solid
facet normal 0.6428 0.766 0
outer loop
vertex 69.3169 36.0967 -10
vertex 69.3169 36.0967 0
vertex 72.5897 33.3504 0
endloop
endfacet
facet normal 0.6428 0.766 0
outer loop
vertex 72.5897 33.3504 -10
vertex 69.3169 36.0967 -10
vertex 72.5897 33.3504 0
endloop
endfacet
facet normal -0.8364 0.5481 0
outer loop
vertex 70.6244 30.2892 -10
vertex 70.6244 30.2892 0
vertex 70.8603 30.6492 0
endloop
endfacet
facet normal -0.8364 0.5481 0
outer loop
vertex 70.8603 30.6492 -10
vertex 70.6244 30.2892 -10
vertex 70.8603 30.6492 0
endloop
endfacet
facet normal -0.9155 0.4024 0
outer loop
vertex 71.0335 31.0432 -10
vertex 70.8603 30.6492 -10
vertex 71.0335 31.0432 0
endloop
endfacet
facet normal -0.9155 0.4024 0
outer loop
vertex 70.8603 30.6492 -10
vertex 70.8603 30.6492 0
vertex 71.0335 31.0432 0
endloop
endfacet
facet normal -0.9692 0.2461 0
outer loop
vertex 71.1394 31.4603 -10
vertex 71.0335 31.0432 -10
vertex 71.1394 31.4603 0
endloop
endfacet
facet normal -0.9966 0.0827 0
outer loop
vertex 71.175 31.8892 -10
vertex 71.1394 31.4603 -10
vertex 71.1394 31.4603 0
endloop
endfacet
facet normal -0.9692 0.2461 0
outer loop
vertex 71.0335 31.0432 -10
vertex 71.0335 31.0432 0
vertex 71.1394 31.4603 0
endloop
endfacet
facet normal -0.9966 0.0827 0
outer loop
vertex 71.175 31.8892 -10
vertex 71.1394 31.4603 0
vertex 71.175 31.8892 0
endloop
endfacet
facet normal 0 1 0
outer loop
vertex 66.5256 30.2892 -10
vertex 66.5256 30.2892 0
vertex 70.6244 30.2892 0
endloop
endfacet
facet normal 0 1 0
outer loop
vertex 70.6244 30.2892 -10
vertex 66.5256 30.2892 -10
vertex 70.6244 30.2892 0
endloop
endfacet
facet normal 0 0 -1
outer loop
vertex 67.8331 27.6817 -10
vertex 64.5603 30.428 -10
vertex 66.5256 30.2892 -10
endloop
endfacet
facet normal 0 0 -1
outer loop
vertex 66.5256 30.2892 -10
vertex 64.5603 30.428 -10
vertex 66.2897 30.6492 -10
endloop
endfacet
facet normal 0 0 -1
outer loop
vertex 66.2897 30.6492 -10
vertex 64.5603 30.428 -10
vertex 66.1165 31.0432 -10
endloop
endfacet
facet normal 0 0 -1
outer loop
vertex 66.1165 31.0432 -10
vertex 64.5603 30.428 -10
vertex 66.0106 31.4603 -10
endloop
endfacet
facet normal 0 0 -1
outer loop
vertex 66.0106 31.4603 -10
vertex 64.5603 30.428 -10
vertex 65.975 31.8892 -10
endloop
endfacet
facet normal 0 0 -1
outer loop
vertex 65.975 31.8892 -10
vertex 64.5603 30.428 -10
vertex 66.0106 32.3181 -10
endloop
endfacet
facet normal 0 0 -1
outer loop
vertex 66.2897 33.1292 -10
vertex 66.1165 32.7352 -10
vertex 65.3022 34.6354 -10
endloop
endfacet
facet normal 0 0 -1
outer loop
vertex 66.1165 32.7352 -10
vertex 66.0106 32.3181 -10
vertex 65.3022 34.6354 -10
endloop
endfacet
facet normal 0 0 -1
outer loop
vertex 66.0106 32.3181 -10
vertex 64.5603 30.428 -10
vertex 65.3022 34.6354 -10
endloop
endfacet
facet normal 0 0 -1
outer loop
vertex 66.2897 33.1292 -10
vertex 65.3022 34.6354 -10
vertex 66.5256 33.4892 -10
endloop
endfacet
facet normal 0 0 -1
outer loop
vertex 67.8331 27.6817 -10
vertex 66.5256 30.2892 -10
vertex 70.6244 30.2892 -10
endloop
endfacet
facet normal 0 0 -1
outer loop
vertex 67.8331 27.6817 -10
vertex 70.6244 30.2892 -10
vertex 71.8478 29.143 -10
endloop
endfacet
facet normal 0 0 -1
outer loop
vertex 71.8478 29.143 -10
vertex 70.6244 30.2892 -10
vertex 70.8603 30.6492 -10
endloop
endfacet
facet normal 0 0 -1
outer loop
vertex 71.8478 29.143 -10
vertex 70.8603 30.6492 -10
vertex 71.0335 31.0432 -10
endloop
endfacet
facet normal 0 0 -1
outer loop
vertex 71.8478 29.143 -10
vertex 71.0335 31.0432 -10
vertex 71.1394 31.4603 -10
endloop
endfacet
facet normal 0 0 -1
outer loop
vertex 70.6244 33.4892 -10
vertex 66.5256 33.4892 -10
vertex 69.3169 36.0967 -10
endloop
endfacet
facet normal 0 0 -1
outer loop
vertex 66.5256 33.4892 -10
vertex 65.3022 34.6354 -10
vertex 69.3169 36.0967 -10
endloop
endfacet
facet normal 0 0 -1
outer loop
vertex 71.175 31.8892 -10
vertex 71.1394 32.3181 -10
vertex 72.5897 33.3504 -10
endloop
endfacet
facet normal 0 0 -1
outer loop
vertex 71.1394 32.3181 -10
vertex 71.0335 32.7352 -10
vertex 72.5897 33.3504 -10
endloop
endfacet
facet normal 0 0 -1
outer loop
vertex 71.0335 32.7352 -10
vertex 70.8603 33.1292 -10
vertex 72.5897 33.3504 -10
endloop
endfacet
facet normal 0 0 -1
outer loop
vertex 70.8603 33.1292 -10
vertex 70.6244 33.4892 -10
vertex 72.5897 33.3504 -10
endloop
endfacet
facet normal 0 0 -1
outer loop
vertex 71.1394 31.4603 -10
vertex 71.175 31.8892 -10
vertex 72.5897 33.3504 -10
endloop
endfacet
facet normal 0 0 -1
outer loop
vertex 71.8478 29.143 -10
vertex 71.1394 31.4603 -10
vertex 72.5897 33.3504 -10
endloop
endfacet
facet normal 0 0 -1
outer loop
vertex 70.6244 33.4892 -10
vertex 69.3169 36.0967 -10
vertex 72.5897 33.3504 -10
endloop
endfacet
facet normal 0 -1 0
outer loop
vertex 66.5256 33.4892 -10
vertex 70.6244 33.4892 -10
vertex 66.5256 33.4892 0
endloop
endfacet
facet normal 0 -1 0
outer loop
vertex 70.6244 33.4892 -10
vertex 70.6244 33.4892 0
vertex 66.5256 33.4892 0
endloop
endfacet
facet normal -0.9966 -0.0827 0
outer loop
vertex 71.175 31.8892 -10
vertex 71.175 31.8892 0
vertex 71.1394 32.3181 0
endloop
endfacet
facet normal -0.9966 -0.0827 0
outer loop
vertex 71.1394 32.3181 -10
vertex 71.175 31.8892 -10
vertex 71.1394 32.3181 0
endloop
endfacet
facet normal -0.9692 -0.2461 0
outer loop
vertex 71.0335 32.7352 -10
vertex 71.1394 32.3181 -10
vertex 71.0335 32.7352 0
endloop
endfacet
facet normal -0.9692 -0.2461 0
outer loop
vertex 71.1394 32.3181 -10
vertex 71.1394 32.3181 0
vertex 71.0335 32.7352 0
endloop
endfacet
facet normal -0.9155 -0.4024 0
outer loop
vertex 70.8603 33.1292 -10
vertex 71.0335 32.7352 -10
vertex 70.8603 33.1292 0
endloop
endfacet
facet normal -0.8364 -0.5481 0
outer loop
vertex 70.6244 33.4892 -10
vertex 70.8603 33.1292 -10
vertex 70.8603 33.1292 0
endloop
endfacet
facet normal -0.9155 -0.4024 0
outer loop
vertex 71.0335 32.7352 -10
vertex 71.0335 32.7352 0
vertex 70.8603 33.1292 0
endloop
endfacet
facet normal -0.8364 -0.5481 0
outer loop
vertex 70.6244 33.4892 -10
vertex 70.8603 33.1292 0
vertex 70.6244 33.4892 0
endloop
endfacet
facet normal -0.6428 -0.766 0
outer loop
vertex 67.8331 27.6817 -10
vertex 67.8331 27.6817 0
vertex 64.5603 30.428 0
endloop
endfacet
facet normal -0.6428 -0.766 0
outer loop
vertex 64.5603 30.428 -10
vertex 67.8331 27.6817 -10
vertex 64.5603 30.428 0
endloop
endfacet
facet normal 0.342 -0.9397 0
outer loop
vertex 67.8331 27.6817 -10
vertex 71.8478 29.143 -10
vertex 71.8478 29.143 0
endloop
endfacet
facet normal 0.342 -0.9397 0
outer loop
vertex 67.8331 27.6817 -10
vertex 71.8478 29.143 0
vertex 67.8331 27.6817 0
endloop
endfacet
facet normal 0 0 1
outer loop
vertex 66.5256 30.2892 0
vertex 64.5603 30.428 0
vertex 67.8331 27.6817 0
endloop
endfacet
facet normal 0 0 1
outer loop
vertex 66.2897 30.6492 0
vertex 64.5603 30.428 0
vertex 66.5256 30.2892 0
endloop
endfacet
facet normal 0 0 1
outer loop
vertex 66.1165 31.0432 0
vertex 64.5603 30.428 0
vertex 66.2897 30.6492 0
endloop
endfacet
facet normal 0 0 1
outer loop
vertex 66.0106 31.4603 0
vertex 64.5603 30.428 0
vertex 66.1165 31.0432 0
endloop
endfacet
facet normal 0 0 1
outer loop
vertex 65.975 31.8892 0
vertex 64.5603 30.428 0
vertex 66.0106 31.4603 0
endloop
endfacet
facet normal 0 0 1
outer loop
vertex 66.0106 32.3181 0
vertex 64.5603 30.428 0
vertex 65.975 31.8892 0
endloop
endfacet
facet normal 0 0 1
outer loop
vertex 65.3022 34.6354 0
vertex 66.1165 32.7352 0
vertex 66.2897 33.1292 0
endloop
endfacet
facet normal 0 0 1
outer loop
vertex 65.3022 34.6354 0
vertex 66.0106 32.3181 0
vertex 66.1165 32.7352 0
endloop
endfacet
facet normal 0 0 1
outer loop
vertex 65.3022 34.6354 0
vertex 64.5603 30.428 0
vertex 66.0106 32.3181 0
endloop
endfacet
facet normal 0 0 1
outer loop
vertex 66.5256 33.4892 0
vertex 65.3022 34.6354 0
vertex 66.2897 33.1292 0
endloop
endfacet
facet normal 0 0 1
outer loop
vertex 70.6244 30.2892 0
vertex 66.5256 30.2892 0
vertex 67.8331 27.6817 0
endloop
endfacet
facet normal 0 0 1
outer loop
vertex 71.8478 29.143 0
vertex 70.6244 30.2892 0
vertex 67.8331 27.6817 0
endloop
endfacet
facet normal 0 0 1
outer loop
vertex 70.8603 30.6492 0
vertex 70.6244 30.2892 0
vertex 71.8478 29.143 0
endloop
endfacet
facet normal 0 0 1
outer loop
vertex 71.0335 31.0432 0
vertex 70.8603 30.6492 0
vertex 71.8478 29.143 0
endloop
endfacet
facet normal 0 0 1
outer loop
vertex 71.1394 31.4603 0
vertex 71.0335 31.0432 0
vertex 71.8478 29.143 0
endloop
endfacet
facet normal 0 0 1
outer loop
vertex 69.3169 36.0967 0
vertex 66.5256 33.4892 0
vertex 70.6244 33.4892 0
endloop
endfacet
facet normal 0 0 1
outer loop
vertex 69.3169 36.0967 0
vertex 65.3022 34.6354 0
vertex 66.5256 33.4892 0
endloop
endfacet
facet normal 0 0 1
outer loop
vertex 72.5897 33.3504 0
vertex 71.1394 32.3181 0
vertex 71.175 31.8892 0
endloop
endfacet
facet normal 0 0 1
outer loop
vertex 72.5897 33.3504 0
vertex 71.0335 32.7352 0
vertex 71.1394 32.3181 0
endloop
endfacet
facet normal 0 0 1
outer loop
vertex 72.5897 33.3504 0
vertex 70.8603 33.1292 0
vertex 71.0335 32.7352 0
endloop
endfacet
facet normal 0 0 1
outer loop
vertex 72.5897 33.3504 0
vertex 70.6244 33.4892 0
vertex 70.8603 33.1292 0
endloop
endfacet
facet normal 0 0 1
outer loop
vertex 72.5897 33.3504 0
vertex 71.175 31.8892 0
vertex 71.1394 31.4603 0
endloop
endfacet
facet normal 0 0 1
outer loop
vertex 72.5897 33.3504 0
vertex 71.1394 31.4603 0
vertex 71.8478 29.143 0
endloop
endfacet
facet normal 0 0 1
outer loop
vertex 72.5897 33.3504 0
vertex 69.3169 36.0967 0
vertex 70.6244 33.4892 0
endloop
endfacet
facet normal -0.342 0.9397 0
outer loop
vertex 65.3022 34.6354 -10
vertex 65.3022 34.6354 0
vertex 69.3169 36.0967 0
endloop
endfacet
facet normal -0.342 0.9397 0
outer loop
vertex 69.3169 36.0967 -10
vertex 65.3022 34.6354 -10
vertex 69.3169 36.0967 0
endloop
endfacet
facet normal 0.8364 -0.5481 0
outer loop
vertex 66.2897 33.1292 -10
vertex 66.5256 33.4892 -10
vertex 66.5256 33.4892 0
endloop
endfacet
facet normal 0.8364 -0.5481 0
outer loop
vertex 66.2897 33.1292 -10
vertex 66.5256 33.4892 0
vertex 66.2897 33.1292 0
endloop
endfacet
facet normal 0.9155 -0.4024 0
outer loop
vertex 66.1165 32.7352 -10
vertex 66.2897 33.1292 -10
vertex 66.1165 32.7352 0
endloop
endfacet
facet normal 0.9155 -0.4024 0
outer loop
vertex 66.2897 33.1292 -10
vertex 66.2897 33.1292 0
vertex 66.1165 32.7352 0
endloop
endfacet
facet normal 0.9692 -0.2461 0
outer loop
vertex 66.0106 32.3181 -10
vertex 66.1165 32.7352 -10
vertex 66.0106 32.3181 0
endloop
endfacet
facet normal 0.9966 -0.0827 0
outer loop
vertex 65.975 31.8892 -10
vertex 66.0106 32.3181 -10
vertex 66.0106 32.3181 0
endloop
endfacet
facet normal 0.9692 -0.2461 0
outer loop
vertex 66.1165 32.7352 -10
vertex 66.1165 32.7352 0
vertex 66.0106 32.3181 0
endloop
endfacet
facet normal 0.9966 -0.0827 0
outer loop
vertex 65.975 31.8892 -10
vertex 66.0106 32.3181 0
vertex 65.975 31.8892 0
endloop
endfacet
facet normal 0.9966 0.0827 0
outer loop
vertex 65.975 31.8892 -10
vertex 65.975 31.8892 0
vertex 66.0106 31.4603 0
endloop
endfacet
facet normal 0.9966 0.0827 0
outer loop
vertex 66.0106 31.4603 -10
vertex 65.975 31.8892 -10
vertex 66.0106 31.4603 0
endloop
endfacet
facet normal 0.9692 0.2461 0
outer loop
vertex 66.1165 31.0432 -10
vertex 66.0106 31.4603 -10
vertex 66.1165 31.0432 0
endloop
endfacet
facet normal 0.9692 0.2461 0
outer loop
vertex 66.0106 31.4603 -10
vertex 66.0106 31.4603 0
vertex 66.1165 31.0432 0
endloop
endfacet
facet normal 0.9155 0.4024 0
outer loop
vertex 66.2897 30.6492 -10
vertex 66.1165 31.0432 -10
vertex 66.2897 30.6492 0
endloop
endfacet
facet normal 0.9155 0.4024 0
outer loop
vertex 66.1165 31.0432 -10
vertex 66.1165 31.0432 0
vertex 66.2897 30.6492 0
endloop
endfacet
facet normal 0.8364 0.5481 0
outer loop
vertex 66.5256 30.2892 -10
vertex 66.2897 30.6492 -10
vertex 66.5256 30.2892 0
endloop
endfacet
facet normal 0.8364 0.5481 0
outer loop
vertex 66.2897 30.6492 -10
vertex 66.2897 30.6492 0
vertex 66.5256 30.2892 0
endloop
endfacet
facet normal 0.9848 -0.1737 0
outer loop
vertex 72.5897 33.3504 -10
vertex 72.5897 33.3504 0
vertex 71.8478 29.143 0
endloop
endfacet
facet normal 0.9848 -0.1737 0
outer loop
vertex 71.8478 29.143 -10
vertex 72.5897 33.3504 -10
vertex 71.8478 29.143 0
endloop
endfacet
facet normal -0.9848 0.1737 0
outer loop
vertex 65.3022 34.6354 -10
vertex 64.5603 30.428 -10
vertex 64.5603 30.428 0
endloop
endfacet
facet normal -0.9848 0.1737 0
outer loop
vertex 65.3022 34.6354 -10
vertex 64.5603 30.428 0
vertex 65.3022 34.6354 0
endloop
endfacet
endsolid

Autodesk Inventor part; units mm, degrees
ref_plane "YZ Plane" through (0, 0, 0) normal (1, 0, 0) x (0, 1, 0)
ref_plane "XZ Plane" through (0, 0, 0) normal (0, 1, 0) x (-1, 0, 0)
ref_plane "XY Plane" through (0, 0, 0) normal (0, 0, 1) x (1, 0, 0)
ref_plane "Arbeitsebene1" through (0, 0, 0) normal (0, 0, 1) x (1, 0, 0)
sketch "Skizze1" plane through (0, 0, 0) normal (0, 0, 1) x (1, 0, 0)
  line L0 (66.6303, 35.3317) -> (67.8519, 35.7763) projected
  circle A0 centre (68.575, 31.8892) radius 5.5 projected
  line L1 (65.3022, 34.6354) -> (69.3169, 36.0967)
  line L2 (69.3169, 36.0967) -> (72.5897, 33.3504)
  line L3 (72.5897, 33.3504) -> (71.8478, 29.143)
  line L4 (71.8478, 29.143) -> (67.8331, 27.6817)
  line L5 (67.8331, 27.6817) -> (64.5603, 30.428)
  line L6 (64.5603, 30.428) -> (65.3022, 34.6354)
  arc A1 (66.575, 33.3892) -> (66.075, 31.8892) centre (68.575, 31.8892) ccw projected
  line L7 (70.575, 33.3892) -> (66.575, 33.3892) projected
  arc A2 (71.075, 31.8892) -> (70.575, 33.3892) centre (68.575, 31.8892) ccw projected
  arc A3 (70.575, 30.3892) -> (71.075, 31.8892) centre (68.575, 31.8892) ccw projected
  line L8 (66.575, 30.3892) -> (70.575, 30.3892) projected
  arc A4 (66.075, 31.8892) -> (66.575, 30.3892) centre (68.575, 31.8892) ccw projected
  arc A5 (66.5256, 33.4892) -> (65.975, 31.8892) centre (68.575, 31.8892) ccw
  arc A6 (65.975, 31.8892) -> (66.5256, 30.2892) centre (68.575, 31.8892) ccw
  line L9 (66.5256, 30.2892) -> (70.6244, 30.2892)
  arc A7 (70.6244, 30.2892) -> (71.175, 31.8892) centre (68.575, 31.8892) ccw
  arc A8 (71.175, 31.8892) -> (70.6244, 33.4892) centre (68.575, 31.8892) ccw
  line L10 (70.6244, 33.4892) -> (66.5256, 33.4892)
  point P0 (0, 0)
  dimension "d0" = 0.2
  dimension "d3" = 0.1
extrude "Extrusion1" add sketch "Skizze1" against normal blind 10 contours L1 L2 L3 L4 L5 L6
properties part number "11_Motor_to_Cassette_Clutch"
